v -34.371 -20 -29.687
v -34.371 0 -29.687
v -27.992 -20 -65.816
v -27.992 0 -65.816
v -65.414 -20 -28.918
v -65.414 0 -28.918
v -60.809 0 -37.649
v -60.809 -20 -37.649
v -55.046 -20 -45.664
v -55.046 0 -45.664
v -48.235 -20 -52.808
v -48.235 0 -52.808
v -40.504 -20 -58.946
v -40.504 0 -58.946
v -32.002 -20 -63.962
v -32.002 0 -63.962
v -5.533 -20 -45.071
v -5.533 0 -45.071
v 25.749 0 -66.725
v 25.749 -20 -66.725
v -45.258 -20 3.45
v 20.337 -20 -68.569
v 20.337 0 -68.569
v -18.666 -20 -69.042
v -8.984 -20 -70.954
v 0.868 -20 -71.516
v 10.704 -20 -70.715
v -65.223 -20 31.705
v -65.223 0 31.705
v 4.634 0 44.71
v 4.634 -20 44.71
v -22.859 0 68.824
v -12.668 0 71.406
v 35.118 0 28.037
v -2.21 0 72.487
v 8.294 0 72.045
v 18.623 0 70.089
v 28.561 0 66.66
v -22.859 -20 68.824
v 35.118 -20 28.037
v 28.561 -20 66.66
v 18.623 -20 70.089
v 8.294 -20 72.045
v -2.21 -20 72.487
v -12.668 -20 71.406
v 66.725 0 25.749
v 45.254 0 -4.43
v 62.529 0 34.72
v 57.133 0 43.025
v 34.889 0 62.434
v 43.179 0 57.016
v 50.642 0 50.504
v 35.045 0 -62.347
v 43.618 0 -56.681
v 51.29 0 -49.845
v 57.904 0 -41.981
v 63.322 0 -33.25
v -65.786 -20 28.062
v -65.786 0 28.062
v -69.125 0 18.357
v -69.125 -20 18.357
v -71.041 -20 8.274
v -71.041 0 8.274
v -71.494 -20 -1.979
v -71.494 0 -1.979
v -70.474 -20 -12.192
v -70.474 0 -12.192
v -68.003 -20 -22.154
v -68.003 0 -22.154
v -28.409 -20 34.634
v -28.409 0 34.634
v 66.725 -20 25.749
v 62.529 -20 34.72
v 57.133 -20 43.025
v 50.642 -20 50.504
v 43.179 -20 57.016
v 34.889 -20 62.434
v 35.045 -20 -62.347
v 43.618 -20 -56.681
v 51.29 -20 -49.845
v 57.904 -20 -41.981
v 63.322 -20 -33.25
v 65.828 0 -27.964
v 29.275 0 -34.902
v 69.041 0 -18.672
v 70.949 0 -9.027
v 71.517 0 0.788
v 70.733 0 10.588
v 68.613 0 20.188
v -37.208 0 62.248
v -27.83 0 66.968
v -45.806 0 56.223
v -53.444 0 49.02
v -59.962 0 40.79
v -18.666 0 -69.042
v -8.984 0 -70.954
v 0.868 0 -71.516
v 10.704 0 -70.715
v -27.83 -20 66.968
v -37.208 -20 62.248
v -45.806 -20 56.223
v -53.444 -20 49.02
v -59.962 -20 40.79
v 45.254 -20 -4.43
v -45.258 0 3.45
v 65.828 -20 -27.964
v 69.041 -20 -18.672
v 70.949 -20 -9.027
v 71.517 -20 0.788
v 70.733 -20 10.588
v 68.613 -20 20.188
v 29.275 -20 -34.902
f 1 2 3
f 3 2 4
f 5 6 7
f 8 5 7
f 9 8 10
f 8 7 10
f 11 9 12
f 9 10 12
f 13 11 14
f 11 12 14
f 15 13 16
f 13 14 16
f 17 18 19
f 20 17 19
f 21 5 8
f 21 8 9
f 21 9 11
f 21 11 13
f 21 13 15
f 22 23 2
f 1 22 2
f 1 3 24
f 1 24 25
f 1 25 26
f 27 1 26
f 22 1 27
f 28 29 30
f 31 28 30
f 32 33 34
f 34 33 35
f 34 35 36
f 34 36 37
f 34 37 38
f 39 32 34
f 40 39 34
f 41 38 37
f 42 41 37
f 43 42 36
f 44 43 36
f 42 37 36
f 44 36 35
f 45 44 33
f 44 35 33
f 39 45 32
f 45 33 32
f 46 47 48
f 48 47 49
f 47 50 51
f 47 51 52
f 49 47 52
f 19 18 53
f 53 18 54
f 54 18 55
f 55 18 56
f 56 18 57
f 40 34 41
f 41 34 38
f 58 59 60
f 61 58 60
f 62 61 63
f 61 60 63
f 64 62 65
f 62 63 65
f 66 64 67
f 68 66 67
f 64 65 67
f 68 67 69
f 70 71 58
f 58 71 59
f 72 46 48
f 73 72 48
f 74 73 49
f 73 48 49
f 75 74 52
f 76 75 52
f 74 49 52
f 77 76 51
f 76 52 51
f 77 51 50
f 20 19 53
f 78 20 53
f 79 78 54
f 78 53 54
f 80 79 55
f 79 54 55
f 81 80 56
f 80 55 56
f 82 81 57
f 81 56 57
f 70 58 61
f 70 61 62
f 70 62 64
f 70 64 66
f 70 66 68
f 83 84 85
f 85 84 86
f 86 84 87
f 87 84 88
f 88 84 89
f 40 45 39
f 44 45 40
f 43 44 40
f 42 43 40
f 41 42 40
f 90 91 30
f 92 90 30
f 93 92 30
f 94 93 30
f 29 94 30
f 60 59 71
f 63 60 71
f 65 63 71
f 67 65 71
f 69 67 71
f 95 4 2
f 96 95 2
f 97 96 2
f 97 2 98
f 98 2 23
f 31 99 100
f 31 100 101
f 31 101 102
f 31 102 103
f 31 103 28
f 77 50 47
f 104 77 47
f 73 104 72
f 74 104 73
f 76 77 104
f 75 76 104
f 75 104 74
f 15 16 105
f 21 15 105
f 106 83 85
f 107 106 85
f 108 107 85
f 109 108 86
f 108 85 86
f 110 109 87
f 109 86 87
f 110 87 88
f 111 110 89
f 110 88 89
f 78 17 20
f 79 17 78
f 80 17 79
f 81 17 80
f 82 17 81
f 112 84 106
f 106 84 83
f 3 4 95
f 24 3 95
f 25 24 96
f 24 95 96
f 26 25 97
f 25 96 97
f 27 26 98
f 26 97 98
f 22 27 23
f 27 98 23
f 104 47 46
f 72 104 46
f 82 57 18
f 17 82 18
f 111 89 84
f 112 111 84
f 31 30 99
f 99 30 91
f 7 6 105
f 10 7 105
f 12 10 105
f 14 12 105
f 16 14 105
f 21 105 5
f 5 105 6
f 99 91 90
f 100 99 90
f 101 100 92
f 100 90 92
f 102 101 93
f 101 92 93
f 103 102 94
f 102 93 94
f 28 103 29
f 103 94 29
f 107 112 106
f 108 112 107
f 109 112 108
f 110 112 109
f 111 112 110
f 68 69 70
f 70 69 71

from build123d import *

# Parameters (mm, degrees)
F8_DEPTH = 20


with BuildPart() as f8:
    # F1 (on Front) + F0 (on Front) + F7 (on Front) + F6 (on Front) + F5 (on Front) + F4 (on Front) + F3 (on Front) + F2 (on Front) → F8 (new body)
    with BuildSketch(Plane.XZ):
        with BuildLine():
            ThreePointArc((28.561161, 66.659621), (3.049683, 72.4565), (-22.858682, 68.823874))
            Line((-22.858682, 68.823874), (35.11805, 28.037024))
            Line((35.11805, 28.037024), (28.561161, 66.659621))
        make_face()
    with BuildSketch(Plane.XZ):
        with BuildLine():
            ThreePointArc((-27.830314, 66.968042), (-49.7555, 52.760167), (-65.223108, 31.70475))
            Line((-65.223108, 31.70475), (4.634389, 44.709688))
            Line((4.634389, 44.709688), (-27.830314, 66.968042))
        make_face()
    with BuildSketch(Plane.XZ):
        with BuildLine():
            ThreePointArc((-65.7857, 28.062343), (-71.451352, 3.15558), (-68.003442, -22.153674))
            Line((-68.003442, -22.153674), (-28.408717, 34.633936))
            Line((-28.408717, 34.633936), (-65.7857, 28.062343))
        make_face()
    with BuildSketch(Plane.XZ):
        with BuildLine():
            ThreePointArc((-65.414011, -28.918171), (-51.763787, -49.353458), (-32.002099, -63.961857))
            Line((-32.002099, -63.961857), (-45.257535, 3.450413))
            Line((-45.257535, 3.450413), (-65.414011, -28.918171))
        make_face()
    with BuildSketch(Plane.XZ):
        with BuildLine():
            ThreePointArc((-27.99212, -65.815611), (-4.067715, -71.405232), (20.336696, -68.568741))
            Line((20.336696, -68.568741), (-34.370954, -29.686954))
            Line((-34.370954, -29.686954), (-27.99212, -65.815611))
        make_face()
    with BuildSketch(Plane.XZ):
        with BuildLine():
            ThreePointArc((25.748918, -66.725158), (47.577061, -53.401093), (63.322352, -33.249558))
            Line((63.322352, -33.249558), (-5.532766, -45.070843))
            Line((-5.532766, -45.070843), (25.748918, -66.725158))
        make_face()
    with BuildSketch(Plane.XZ):
        with BuildLine():
            ThreePointArc((65.82764, -27.963821), (71.401684, -4.129527), (68.612534, 20.188453))
            Line((68.612534, 20.188453), (29.274906, -34.902486))
            Line((29.274906, -34.902486), (65.82764, -27.963821))
        make_face()
    with BuildSketch(Plane.XZ):
        with BuildLine():
            ThreePointArc((66.725311, 25.748892), (54.01687, 46.876971), (34.889051, 62.434179))
            Line((34.889051, 62.434179), (45.254067, -4.429553))
            Line((45.254067, -4.429553), (66.725311, 25.748892))
        make_face()
    extrude(amount=F8_DEPTH)


solid = f8.part
